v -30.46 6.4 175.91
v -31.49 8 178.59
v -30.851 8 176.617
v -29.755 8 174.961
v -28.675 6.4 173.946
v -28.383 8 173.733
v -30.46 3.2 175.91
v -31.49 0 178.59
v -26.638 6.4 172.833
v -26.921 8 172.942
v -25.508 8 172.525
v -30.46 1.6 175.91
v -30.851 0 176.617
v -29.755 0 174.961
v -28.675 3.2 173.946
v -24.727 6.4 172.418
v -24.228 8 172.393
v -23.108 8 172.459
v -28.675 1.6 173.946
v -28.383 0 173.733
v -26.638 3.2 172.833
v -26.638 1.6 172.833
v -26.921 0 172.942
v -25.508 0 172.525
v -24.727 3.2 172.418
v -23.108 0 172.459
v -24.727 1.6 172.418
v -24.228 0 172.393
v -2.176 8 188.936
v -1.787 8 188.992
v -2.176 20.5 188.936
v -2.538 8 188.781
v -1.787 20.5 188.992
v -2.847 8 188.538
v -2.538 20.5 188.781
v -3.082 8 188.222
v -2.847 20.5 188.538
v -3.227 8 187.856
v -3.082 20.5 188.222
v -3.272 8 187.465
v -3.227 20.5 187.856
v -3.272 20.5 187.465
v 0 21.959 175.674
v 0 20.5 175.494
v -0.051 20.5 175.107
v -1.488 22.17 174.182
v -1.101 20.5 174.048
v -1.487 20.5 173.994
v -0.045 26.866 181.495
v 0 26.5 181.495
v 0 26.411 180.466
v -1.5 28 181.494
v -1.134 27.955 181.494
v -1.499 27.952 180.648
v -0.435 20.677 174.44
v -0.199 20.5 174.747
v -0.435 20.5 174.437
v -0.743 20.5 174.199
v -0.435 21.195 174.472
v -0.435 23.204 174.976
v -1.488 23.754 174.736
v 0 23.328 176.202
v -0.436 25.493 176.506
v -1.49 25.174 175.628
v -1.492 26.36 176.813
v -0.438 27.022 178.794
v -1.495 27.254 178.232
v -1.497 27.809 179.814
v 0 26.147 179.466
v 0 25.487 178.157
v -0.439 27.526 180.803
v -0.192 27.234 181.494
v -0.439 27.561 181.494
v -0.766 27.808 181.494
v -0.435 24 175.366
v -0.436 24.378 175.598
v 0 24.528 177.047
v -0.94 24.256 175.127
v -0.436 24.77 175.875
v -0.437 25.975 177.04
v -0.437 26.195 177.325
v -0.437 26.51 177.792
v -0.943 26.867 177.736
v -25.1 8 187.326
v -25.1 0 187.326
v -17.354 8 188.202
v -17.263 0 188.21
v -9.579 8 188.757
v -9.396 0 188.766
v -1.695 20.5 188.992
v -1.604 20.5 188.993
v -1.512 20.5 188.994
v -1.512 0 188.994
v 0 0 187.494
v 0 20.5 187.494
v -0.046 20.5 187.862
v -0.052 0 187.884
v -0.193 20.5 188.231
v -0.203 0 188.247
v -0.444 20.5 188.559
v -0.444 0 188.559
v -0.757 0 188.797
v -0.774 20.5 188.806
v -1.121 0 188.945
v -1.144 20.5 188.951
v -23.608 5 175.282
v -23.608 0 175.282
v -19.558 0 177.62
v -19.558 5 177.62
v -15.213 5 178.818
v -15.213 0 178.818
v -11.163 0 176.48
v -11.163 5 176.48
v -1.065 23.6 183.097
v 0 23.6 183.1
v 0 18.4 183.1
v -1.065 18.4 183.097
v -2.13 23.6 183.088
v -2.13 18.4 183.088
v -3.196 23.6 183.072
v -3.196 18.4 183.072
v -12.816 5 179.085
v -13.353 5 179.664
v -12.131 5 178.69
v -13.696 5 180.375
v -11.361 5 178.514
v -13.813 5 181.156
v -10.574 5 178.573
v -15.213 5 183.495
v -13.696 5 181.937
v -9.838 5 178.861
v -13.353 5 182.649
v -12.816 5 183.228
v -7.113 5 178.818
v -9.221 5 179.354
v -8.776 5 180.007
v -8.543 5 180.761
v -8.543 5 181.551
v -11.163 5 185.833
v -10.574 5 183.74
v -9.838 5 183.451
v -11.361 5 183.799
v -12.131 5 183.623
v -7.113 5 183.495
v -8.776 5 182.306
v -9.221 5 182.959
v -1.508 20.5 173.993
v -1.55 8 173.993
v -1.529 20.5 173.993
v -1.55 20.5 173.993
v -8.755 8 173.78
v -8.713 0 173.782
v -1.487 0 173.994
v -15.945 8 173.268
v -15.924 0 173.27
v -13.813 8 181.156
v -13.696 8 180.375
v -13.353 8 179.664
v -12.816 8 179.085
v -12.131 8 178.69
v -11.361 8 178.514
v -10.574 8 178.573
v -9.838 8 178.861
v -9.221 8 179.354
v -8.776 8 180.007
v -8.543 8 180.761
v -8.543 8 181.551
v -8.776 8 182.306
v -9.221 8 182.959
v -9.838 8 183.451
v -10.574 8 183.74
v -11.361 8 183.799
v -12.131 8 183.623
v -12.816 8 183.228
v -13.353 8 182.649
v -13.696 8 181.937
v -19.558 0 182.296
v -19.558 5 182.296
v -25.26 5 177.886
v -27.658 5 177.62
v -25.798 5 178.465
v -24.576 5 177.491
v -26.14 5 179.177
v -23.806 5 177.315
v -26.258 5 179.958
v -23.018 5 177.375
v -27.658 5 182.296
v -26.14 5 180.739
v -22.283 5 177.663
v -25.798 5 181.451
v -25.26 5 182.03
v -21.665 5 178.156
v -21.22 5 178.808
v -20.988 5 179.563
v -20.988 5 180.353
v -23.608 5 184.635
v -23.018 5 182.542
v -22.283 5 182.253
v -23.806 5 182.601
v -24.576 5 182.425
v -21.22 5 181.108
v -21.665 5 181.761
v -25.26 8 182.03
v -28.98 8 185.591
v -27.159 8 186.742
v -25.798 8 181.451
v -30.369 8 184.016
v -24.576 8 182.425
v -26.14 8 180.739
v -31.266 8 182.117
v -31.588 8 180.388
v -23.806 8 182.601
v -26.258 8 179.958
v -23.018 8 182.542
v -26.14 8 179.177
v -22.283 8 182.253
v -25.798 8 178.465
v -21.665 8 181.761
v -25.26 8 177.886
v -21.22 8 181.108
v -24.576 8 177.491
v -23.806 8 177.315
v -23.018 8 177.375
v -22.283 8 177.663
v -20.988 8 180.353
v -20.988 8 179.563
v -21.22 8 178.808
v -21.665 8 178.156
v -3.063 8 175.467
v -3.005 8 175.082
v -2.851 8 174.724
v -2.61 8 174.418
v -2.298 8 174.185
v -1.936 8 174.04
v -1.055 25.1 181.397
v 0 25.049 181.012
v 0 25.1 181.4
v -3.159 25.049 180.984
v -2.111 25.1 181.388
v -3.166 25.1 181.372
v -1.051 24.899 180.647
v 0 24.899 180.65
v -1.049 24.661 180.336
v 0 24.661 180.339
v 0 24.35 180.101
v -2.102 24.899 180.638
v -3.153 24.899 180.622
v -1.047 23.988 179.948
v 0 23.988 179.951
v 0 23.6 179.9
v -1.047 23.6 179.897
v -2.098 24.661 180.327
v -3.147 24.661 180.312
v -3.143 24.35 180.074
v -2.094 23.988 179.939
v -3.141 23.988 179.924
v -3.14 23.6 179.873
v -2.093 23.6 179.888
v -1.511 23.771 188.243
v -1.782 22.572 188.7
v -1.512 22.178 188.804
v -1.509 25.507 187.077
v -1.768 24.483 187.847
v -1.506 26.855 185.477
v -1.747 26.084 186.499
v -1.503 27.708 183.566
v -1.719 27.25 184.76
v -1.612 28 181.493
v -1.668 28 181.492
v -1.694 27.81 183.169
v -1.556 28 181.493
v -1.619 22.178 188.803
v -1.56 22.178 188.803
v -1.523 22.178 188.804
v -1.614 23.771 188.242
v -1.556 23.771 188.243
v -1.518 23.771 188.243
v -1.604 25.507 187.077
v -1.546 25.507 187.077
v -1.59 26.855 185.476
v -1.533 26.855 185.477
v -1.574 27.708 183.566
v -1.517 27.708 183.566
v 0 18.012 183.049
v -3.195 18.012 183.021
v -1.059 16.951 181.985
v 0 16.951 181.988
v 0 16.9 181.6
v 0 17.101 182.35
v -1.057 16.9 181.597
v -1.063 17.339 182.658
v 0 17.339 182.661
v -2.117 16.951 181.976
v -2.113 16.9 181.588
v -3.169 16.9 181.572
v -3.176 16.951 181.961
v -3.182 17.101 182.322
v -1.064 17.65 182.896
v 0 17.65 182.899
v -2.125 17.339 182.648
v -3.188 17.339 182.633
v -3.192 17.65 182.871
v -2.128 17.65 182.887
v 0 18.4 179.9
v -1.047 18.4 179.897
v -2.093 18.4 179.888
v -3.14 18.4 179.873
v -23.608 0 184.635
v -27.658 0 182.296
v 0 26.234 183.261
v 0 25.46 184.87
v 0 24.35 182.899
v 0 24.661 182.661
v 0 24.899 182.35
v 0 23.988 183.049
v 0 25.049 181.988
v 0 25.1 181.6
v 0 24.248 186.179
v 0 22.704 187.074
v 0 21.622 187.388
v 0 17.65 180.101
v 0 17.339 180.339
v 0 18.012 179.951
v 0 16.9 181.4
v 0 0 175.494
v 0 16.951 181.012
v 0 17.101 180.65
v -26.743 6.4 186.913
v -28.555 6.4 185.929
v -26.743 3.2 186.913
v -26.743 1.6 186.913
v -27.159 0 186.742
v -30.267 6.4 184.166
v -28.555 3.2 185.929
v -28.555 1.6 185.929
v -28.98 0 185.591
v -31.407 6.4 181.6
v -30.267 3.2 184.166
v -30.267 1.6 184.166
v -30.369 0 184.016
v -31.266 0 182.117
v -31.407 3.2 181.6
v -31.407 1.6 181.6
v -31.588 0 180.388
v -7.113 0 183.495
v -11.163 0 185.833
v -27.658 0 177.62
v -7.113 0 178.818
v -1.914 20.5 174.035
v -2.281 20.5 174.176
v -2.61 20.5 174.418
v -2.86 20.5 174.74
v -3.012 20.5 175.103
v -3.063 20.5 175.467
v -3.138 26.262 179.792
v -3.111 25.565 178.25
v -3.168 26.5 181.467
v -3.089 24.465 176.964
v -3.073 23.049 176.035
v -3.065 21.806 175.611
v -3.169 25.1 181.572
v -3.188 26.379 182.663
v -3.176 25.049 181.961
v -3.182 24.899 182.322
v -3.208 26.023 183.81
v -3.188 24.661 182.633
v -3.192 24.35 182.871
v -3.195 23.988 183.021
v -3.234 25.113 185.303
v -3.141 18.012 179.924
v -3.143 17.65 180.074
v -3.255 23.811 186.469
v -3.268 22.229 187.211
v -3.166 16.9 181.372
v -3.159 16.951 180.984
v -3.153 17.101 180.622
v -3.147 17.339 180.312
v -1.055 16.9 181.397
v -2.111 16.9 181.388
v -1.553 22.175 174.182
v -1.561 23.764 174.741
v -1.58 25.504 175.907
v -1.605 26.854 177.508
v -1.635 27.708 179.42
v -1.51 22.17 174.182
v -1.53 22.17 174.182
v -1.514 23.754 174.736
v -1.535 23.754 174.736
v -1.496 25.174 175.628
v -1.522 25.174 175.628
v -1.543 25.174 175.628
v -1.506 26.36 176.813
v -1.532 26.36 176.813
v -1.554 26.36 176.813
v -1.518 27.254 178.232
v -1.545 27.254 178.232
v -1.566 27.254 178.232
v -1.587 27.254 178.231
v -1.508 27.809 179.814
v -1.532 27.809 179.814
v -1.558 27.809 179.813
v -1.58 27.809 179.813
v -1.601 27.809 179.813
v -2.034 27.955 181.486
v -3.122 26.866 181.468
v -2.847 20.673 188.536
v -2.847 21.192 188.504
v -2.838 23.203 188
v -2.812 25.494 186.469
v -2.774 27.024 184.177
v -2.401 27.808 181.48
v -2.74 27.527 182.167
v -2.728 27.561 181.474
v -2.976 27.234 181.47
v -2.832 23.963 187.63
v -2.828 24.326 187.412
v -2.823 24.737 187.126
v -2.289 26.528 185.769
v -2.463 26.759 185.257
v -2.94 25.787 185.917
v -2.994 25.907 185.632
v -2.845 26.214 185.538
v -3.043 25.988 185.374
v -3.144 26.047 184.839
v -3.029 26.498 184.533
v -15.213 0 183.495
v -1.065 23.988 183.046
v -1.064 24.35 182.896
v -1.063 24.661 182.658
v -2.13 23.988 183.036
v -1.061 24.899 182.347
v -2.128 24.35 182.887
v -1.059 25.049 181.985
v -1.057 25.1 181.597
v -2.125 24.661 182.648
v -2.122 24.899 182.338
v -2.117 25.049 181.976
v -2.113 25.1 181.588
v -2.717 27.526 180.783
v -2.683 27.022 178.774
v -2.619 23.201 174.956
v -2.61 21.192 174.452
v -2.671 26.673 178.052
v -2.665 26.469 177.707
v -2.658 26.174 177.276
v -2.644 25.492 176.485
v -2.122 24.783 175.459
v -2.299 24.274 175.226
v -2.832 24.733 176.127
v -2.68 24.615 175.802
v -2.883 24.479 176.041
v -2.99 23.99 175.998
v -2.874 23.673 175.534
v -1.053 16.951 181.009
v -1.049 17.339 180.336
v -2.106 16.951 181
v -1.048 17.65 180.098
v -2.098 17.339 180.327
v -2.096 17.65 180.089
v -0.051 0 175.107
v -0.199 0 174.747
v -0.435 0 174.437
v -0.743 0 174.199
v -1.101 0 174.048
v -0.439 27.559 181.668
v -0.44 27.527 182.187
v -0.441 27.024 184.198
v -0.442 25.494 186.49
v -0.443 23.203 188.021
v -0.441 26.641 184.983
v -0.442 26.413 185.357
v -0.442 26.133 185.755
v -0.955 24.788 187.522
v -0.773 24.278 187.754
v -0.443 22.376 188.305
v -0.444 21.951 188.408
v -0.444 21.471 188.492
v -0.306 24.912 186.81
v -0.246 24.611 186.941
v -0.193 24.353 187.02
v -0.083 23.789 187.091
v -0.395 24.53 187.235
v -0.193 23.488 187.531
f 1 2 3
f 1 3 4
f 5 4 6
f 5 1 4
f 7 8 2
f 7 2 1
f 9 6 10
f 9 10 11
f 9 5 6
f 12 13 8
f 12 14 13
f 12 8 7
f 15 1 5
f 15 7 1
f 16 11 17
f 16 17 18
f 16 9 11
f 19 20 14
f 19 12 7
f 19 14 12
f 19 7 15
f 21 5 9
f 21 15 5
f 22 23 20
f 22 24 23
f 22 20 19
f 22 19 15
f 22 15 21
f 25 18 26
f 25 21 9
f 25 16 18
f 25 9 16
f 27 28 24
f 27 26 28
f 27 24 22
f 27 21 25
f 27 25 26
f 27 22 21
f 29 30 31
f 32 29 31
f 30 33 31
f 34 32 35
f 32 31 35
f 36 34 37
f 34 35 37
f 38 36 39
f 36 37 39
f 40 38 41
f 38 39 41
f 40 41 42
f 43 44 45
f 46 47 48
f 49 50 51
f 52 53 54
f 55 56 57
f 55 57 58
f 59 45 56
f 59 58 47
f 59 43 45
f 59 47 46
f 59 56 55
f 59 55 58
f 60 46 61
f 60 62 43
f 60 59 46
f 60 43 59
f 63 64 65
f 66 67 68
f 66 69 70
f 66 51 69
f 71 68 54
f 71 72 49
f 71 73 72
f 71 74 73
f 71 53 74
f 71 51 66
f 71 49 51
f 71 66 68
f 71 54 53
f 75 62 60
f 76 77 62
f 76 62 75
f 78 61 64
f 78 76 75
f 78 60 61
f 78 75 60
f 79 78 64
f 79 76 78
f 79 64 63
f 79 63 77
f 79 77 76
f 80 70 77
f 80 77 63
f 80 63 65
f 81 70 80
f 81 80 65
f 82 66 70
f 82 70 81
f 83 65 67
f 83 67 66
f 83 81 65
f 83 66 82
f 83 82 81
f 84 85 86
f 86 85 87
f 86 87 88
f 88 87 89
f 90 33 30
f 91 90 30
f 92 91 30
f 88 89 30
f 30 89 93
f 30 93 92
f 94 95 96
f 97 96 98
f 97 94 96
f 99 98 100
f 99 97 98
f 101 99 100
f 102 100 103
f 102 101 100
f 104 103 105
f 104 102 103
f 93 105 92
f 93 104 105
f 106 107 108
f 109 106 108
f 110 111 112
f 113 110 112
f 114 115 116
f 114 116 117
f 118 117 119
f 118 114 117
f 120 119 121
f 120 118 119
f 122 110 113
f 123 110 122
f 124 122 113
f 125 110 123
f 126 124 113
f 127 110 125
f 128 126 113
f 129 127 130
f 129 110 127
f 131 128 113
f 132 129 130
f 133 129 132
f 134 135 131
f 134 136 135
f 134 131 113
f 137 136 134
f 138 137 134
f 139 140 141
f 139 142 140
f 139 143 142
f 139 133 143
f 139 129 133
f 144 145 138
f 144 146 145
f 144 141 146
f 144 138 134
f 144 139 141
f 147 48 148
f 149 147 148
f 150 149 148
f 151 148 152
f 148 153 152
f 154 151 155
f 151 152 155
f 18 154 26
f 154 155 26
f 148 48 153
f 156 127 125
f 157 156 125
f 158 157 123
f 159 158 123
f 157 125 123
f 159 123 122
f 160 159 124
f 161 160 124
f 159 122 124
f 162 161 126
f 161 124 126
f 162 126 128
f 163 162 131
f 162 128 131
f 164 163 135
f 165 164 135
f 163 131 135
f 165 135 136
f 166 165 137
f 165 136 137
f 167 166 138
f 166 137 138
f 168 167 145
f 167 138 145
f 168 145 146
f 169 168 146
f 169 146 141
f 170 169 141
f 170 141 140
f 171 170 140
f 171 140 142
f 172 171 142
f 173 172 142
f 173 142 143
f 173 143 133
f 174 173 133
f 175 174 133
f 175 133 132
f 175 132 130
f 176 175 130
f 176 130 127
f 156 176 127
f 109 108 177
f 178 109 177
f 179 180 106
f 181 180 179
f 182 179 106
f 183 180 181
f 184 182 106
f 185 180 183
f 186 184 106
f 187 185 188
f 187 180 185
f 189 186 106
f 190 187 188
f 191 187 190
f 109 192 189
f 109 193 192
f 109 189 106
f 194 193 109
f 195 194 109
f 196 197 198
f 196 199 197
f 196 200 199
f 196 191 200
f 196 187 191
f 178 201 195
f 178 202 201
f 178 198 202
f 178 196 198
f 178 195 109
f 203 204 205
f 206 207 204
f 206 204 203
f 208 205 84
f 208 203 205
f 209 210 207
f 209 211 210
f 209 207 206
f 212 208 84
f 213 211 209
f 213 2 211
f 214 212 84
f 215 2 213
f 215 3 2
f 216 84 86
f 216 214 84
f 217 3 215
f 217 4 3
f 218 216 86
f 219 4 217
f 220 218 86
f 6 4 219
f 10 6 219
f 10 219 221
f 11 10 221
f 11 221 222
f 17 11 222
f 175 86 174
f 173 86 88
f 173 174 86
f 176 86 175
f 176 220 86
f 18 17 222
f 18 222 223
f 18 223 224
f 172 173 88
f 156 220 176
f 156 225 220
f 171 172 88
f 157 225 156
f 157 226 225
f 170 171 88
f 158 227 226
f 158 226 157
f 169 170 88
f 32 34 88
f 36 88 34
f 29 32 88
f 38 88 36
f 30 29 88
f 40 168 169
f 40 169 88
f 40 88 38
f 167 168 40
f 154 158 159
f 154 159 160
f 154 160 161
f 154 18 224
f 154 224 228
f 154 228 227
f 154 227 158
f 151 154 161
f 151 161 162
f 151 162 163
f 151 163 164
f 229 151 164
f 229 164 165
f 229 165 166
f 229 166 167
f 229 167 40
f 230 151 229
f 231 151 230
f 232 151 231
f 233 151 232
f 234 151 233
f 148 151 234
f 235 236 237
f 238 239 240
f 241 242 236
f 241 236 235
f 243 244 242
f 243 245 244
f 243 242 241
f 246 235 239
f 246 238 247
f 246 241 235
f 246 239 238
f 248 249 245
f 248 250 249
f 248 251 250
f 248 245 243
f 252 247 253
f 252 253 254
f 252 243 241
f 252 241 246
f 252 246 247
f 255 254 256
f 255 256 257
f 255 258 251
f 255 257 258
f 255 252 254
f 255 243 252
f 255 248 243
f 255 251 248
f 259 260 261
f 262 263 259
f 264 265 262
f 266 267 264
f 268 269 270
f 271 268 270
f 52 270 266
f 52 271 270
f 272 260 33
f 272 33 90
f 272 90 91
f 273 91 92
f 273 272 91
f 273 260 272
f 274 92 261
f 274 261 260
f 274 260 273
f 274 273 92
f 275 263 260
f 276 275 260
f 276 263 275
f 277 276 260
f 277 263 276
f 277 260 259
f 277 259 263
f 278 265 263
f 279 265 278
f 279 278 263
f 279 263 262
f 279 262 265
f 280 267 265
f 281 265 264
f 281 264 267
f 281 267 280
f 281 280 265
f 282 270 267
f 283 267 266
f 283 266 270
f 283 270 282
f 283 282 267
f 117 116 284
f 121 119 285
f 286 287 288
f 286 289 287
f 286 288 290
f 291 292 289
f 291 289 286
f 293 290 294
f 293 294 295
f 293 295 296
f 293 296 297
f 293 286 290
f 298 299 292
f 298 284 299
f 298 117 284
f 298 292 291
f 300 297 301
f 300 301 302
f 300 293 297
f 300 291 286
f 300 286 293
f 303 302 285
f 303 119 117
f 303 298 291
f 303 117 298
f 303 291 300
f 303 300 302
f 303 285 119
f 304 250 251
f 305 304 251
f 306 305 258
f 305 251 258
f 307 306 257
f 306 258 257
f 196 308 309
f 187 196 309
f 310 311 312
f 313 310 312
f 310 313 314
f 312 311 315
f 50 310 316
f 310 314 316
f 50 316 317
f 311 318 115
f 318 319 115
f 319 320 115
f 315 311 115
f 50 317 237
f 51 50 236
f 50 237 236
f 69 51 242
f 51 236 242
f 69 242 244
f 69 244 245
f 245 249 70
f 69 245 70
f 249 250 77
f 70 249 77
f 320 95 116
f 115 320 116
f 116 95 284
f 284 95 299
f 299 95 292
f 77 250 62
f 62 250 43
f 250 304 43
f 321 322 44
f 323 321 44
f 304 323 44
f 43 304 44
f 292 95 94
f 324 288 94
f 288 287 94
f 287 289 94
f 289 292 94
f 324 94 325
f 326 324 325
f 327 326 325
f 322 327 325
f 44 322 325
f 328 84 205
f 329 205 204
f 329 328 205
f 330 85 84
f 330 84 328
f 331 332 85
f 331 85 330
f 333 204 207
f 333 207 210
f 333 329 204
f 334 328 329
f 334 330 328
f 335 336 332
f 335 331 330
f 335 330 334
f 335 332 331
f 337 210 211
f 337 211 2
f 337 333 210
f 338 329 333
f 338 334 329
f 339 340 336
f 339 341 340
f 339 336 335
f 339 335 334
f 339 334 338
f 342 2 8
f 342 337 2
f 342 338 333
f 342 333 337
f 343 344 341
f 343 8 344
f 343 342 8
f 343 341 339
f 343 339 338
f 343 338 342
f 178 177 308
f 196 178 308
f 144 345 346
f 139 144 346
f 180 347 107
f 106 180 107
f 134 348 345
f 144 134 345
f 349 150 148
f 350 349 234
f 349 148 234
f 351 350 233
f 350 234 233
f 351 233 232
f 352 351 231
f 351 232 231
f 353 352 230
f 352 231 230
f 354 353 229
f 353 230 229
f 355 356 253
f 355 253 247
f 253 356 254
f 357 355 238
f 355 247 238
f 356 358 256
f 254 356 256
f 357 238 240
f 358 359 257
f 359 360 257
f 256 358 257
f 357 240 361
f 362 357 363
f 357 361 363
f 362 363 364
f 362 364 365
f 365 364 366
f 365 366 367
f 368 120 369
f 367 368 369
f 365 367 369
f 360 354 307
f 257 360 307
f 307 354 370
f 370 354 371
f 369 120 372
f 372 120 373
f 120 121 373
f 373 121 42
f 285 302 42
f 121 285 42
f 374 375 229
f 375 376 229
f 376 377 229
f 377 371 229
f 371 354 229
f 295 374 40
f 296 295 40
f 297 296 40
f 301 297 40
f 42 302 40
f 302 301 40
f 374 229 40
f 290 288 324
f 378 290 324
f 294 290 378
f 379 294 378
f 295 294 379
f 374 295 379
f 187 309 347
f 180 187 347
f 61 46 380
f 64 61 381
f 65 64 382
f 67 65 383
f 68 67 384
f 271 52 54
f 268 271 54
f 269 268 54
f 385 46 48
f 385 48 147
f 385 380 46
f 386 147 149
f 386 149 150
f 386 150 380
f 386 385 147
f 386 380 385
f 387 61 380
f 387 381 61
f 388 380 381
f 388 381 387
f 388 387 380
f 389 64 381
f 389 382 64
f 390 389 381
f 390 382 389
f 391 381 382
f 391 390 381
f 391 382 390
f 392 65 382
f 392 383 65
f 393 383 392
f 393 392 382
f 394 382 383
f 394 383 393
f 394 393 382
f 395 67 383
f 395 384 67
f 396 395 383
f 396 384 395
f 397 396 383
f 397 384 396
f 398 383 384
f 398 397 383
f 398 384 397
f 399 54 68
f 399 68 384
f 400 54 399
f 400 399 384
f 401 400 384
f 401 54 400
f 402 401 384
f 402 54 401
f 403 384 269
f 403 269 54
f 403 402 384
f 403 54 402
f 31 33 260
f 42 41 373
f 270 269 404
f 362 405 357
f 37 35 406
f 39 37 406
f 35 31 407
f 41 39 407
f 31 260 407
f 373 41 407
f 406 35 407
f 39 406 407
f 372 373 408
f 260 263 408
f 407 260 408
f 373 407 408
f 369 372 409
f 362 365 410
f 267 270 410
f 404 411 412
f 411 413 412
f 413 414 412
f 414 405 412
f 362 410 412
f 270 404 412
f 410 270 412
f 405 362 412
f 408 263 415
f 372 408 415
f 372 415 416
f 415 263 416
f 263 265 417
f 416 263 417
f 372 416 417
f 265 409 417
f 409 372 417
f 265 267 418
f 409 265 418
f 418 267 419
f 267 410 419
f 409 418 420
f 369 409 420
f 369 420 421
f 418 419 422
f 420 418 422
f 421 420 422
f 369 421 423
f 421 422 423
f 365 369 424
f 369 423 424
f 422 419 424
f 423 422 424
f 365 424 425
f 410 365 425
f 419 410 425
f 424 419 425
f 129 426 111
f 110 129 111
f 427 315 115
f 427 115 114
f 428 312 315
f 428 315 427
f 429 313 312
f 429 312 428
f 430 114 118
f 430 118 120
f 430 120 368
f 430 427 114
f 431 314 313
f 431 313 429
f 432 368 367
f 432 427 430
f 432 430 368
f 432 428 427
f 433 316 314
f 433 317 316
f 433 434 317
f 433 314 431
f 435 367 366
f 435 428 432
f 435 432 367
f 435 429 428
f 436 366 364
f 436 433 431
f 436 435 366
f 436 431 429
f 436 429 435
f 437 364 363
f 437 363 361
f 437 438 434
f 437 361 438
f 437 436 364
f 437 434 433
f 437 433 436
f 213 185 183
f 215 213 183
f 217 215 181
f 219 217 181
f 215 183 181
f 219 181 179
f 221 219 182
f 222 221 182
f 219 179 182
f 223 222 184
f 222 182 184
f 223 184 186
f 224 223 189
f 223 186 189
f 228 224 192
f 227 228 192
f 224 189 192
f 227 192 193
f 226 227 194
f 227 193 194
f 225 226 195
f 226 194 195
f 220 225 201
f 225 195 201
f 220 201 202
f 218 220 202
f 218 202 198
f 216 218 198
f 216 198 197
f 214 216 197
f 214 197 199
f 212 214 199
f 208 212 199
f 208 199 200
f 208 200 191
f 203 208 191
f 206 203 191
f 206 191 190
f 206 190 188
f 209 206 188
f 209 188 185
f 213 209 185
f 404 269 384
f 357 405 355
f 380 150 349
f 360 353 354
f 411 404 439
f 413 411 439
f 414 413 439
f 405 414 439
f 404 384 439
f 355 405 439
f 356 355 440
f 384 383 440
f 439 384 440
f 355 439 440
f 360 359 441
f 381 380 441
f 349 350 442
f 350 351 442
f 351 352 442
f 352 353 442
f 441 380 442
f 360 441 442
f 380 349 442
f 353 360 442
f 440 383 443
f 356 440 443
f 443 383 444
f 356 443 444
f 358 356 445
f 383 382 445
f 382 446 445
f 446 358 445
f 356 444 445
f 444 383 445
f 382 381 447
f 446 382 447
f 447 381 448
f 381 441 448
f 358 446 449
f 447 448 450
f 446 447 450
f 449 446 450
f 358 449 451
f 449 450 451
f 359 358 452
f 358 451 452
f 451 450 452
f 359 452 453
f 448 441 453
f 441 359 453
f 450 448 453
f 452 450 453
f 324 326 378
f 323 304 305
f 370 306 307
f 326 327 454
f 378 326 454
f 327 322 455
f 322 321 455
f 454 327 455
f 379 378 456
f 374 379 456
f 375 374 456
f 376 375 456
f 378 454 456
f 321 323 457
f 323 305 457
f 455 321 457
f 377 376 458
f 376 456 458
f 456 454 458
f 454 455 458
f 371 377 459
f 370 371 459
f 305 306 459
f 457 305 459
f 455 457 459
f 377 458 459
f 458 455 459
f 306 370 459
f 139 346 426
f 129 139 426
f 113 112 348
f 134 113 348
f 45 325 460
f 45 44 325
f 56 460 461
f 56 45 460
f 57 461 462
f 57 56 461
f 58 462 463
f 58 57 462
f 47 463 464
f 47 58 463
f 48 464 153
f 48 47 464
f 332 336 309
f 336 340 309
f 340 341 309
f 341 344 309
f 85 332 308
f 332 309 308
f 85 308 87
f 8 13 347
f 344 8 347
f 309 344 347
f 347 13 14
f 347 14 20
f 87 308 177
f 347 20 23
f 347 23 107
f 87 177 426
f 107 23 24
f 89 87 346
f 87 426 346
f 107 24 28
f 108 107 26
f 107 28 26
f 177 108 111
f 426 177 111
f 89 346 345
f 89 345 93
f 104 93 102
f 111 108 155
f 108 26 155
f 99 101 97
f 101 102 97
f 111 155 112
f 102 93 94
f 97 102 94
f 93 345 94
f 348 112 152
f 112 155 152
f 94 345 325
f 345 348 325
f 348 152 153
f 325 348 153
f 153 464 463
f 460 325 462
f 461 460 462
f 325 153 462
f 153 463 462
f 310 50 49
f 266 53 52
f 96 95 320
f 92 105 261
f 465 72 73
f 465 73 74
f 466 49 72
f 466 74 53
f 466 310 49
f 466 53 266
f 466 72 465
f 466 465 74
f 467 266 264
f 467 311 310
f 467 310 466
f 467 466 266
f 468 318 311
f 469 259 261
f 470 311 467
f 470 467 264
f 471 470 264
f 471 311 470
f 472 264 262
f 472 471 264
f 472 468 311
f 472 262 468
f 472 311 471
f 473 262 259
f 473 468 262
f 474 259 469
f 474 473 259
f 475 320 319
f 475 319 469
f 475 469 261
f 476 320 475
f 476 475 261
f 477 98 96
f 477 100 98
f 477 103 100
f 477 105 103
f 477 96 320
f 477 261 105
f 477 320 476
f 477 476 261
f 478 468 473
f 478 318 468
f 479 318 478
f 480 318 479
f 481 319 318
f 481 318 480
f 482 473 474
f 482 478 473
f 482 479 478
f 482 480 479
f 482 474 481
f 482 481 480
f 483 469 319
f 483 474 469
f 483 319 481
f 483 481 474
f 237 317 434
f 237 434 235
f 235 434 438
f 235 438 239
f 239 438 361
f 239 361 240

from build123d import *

# Parameters (mm, degrees)
EXTRUDE_1_DEPTH     = 8
EXTRUDE_2_DEPTH     = 20
HOLE_WIZARD_M5_1_D  = 5.3
FILLET_1_R          = 7.5
FILLET_2_DEPTH      = 8
SKETCH_5_W          = 3.1999999999999886
SKETCH_5_H          = 8.2
FILLET_3_R          = 1.5
FILLET_4_R          = 1.5
CUT_EXTRUDE_1_DEPTH = 5


with BuildPart() as part:
    # 草图1 → 凸台-拉伸1 (new body)
    with BuildSketch(Plane(origin=(0, 0, 0), x_dir=(1, 0, 0), z_dir=(0, 1, 0))):
        with BuildLine():
            Line((2.098e-14, -189), (1.932e-14, -174.00000000000003))
            ThreePointArc((2.28618e-12, -174.00000000000003), (-15.165099238093463, -173.33787746796366), (-30.214782914050144, -171.35654902412347))
            Line((-30.214782914045937, -171.35654902412418), (-32.8195055790499, -186.12866531930732))
            ThreePointArc((-32.81950557905, -186.12866531930732), (-16.472435379307413, -188.28079793933995), (-3.472e-14, -189.00000000000003))
        make_face()
    extrude(amount=EXTRUDE_1_DEPTH)

    # 草图4 → 凸台-拉伸2 (add)
    with BuildSketch(Plane(origin=(0, 8, 0), x_dir=(1, 0, 0), z_dir=(0, 1, 0))):
        with BuildLine():
            Line((2.082e-14, -189), (1.916e-14, -174))
            ThreePointArc((-3.196e-14, -174.00000000000003), (-1.5184171767173116, -173.99337461316583), (-3.0367187200877925, -173.9734989572121))
            Line((-3.036718720087315, -173.97349895721206), (-3.298504816646567, -188.97121438455795))
            ThreePointArc((-3.2985048166465822, -188.971214384558), (-1.6493152091926062, -188.99280345912842), (-3.472e-14, -189.00000000000006))
        make_face()
    extrude(amount=EXTRUDE_2_DEPTH)

    # M5 间隙孔1 (through all)
    with Locations(Plane(origin=(0, 8, 0), x_dir=(1, 0, 0), z_dir=(0, 1, 0))):
        with Locations((-23.608051681, -179.958078162), (-11.163314825, -181.156370029)):
            Hole(HOLE_WIZARD_M5_1_D / 2)

    # 圆角1
    # the kernel refuses this fillet: 7.5 mm, written as the material it takes off along each edge
    with BuildSketch(Plane(origin=(1.47232e-12, 28, -1.0760459e-10), x_dir=(0.10755019962978496, 0, 0.9941996552803635), z_dir=(0.9941996552803635, 0, -0.10755019962978496))) as fillet_1_piece_1:
        with BuildLine():
            CenterArc((174.00000000010766 + FILLET_1_R, FILLET_1_R), FILLET_1_R, 180, 89.99999999999977)
            Line((174.00000000010766 + FILLET_1_R, 0), (174.00000000010766, 0))
            Line((174.00000000010766, 0), (174.00000000010766, FILLET_1_R))
        make_face()
    revolve(axis=Axis((1.47232e-12, 28, -1.0760459e-10), (0, -1, 0)), revolution_arc=13.348228955549553, mode=Mode.SUBTRACT)
    with BuildSketch(Plane(origin=(2.05469e-12, 28, -2.9481839e-10), x_dir=(-0.11639521392683701, 0, 0.9932029773288671), z_dir=(-0.9932029773288671, 0, -0.11639521392683701))) as fillet_1_piece_2:
        with BuildLine():
            CenterArc((189.0000000002949 - FILLET_1_R, -FILLET_1_R), FILLET_1_R, 0, 89.99999999999957)
            Line((189.0000000002949 - FILLET_1_R, 0), (189.0000000002949, 0))
            Line((189.0000000002949, 0), (189.00000000029488, -FILLET_1_R))
        make_face()
    revolve(axis=Axis((2.05469e-12, 28, -2.9481839e-10), (0, 1, 0)), revolution_arc=12.368210784462358, mode=Mode.SUBTRACT)

    # 圆角2: read off the stored shape, not the designer's step
    # 圆角2 outline → 圆角2 (cut)
    with BuildSketch(Plane(origin=(0, 0, 0), x_dir=(1, 0, 0), z_dir=(0, 1, 0))):
        with BuildLine():
            ThreePointArc((-32.819505579, -186.128665319), (-28.966041771, -186.767150281), (-25.100206236, -187.325864863))
            add(Edge.make_bspline(
                [(-25.100206236, -187.325864863), (-27.006863278382305, -187.07038767754574), (-29.132080374521447, -186.17341393049847), (-31.048536919413714, -184.35464406978926), (-32.02623112721157, -181.62978297542463), (-31.490224503, -178.589937725)],
                knots=[0, 0, 0, 0, 0, 0, 0.5103349834155644, 0.5103349834155644, 0.5103349834155644, 0.5103349834155644, 0.5103349834155644, 0.5103349834155644], degree=5, weights=[1, 0.7958660065557144, 0.6438203721908997, 0.5438630969055563, 0.4959941806996843, 0.5002136235732837]))
            Line((-31.490224503, -178.589937725), (-32.819505579, -186.128665319))
        make_face()
        with BuildLine():
            Line((-30.214782914, -171.356549024), (-31.490224503, -178.589937725))
            add(Edge.make_bspline(
                [(-31.490224503, -178.589937725), (-30.984360135627078, -175.72103774319677), (-29.29551148466263, -173.58668082656104), (-27.075163325391554, -172.48015181385665), (-24.918748626576246, -172.21612345785414), (-23.108126376, -172.458732732)],
                knots=[0.5103349834155644, 0.5103349834155644, 0.5103349834155644, 0.5103349834155644, 0.5103349834155644, 0.5103349834155644, 1, 1, 1, 1, 1, 1], degree=5, weights=[0.5002136235732837, 0.5042621674352976, 0.5562650770089762, 0.6562223522943196, 0.8041339932913276, 1]))
            ThreePointArc((-23.108126376, -172.458732732), (-26.667149567, -171.944360576), (-30.214782914, -171.356549024))
        make_face()
    extrude(amount=FILLET_2_DEPTH, mode=Mode.SUBTRACT)

    # 草图5 → 切除-旋转1 (revolve, cut)
    with BuildSketch(Plane(origin=(0, 0, 0), x_dir=(-0.01745240643728342, 0, 0.9998476951563913), z_dir=(-0.9998476951563913, 0, -0.01745240643728342))):
        with Locations((181.5, 20.99999999999998)):
            Rectangle(SKETCH_5_W, SKETCH_5_H)
    revolve(axis=Axis((0, 55.00000000000001, 0), (0, -1, 0)), mode=Mode.SUBTRACT)

    # 圆角3
    fillet_3_edges = [part.edges().sort_by_distance(p)[0] for p in [
        (-1.5978286497523058, 25.09999999999998, 183.09302811304977),
        (-1.5978286497523058, 16.899999999999984, 183.09302811304977),
        (-1.5699037361575081, 16.899999999999984, 179.89314995924443),
        (-1.5699037361575081, 25.09999999999998, 179.89314995924443),
    ]]
    fillet(fillet_3_edges, radius=FILLET_3_R)

    # 圆角4
    fillet_4_edges = [part.edges().sort_by_distance(p)[0] for p in [
        (-8.49e-15, 10.25, 189.00000000000003),
        (-3.2985048166465747, 14.25, 188.97121438455798),
        (-3.0367187200875536, 14.25, 173.9734989572121),
        (7.2842e-13, 10.25, 174.00000000000003),
        (-1.5838661929530051, 28, 181.4930890361471),
        (-1.5838661929530051, 28, 181.4930890361471),
    ]]
    fillet(fillet_4_edges, radius=FILLET_4_R)

    # 草图6 → 切除-拉伸1 (cut)
    with BuildSketch(Plane.XZ):
        Polygon((-23.608051681342282, 175.2815409817045), (-19.55805168134228, 177.6198095719225), (-19.55805168134228, 182.29634675235855), (-23.608051681342257, 184.6346153425765), (-27.658051681342297, 182.29634675235852), (-27.658051681342297, 177.6198095719225), align=None)
        Polygon((-11.163314825368898, 176.479832848635), (-7.113314825368922, 178.81810143885298), (-7.1133148253689225, 183.49463861928896), (-11.163314825368879, 185.83290720950694), (-15.213314825368883, 183.49463861928893), (-15.213314825368883, 178.81810143885298), align=None)
    extrude(amount=-CUT_EXTRUDE_1_DEPTH, mode=Mode.SUBTRACT)


solid = part.part
